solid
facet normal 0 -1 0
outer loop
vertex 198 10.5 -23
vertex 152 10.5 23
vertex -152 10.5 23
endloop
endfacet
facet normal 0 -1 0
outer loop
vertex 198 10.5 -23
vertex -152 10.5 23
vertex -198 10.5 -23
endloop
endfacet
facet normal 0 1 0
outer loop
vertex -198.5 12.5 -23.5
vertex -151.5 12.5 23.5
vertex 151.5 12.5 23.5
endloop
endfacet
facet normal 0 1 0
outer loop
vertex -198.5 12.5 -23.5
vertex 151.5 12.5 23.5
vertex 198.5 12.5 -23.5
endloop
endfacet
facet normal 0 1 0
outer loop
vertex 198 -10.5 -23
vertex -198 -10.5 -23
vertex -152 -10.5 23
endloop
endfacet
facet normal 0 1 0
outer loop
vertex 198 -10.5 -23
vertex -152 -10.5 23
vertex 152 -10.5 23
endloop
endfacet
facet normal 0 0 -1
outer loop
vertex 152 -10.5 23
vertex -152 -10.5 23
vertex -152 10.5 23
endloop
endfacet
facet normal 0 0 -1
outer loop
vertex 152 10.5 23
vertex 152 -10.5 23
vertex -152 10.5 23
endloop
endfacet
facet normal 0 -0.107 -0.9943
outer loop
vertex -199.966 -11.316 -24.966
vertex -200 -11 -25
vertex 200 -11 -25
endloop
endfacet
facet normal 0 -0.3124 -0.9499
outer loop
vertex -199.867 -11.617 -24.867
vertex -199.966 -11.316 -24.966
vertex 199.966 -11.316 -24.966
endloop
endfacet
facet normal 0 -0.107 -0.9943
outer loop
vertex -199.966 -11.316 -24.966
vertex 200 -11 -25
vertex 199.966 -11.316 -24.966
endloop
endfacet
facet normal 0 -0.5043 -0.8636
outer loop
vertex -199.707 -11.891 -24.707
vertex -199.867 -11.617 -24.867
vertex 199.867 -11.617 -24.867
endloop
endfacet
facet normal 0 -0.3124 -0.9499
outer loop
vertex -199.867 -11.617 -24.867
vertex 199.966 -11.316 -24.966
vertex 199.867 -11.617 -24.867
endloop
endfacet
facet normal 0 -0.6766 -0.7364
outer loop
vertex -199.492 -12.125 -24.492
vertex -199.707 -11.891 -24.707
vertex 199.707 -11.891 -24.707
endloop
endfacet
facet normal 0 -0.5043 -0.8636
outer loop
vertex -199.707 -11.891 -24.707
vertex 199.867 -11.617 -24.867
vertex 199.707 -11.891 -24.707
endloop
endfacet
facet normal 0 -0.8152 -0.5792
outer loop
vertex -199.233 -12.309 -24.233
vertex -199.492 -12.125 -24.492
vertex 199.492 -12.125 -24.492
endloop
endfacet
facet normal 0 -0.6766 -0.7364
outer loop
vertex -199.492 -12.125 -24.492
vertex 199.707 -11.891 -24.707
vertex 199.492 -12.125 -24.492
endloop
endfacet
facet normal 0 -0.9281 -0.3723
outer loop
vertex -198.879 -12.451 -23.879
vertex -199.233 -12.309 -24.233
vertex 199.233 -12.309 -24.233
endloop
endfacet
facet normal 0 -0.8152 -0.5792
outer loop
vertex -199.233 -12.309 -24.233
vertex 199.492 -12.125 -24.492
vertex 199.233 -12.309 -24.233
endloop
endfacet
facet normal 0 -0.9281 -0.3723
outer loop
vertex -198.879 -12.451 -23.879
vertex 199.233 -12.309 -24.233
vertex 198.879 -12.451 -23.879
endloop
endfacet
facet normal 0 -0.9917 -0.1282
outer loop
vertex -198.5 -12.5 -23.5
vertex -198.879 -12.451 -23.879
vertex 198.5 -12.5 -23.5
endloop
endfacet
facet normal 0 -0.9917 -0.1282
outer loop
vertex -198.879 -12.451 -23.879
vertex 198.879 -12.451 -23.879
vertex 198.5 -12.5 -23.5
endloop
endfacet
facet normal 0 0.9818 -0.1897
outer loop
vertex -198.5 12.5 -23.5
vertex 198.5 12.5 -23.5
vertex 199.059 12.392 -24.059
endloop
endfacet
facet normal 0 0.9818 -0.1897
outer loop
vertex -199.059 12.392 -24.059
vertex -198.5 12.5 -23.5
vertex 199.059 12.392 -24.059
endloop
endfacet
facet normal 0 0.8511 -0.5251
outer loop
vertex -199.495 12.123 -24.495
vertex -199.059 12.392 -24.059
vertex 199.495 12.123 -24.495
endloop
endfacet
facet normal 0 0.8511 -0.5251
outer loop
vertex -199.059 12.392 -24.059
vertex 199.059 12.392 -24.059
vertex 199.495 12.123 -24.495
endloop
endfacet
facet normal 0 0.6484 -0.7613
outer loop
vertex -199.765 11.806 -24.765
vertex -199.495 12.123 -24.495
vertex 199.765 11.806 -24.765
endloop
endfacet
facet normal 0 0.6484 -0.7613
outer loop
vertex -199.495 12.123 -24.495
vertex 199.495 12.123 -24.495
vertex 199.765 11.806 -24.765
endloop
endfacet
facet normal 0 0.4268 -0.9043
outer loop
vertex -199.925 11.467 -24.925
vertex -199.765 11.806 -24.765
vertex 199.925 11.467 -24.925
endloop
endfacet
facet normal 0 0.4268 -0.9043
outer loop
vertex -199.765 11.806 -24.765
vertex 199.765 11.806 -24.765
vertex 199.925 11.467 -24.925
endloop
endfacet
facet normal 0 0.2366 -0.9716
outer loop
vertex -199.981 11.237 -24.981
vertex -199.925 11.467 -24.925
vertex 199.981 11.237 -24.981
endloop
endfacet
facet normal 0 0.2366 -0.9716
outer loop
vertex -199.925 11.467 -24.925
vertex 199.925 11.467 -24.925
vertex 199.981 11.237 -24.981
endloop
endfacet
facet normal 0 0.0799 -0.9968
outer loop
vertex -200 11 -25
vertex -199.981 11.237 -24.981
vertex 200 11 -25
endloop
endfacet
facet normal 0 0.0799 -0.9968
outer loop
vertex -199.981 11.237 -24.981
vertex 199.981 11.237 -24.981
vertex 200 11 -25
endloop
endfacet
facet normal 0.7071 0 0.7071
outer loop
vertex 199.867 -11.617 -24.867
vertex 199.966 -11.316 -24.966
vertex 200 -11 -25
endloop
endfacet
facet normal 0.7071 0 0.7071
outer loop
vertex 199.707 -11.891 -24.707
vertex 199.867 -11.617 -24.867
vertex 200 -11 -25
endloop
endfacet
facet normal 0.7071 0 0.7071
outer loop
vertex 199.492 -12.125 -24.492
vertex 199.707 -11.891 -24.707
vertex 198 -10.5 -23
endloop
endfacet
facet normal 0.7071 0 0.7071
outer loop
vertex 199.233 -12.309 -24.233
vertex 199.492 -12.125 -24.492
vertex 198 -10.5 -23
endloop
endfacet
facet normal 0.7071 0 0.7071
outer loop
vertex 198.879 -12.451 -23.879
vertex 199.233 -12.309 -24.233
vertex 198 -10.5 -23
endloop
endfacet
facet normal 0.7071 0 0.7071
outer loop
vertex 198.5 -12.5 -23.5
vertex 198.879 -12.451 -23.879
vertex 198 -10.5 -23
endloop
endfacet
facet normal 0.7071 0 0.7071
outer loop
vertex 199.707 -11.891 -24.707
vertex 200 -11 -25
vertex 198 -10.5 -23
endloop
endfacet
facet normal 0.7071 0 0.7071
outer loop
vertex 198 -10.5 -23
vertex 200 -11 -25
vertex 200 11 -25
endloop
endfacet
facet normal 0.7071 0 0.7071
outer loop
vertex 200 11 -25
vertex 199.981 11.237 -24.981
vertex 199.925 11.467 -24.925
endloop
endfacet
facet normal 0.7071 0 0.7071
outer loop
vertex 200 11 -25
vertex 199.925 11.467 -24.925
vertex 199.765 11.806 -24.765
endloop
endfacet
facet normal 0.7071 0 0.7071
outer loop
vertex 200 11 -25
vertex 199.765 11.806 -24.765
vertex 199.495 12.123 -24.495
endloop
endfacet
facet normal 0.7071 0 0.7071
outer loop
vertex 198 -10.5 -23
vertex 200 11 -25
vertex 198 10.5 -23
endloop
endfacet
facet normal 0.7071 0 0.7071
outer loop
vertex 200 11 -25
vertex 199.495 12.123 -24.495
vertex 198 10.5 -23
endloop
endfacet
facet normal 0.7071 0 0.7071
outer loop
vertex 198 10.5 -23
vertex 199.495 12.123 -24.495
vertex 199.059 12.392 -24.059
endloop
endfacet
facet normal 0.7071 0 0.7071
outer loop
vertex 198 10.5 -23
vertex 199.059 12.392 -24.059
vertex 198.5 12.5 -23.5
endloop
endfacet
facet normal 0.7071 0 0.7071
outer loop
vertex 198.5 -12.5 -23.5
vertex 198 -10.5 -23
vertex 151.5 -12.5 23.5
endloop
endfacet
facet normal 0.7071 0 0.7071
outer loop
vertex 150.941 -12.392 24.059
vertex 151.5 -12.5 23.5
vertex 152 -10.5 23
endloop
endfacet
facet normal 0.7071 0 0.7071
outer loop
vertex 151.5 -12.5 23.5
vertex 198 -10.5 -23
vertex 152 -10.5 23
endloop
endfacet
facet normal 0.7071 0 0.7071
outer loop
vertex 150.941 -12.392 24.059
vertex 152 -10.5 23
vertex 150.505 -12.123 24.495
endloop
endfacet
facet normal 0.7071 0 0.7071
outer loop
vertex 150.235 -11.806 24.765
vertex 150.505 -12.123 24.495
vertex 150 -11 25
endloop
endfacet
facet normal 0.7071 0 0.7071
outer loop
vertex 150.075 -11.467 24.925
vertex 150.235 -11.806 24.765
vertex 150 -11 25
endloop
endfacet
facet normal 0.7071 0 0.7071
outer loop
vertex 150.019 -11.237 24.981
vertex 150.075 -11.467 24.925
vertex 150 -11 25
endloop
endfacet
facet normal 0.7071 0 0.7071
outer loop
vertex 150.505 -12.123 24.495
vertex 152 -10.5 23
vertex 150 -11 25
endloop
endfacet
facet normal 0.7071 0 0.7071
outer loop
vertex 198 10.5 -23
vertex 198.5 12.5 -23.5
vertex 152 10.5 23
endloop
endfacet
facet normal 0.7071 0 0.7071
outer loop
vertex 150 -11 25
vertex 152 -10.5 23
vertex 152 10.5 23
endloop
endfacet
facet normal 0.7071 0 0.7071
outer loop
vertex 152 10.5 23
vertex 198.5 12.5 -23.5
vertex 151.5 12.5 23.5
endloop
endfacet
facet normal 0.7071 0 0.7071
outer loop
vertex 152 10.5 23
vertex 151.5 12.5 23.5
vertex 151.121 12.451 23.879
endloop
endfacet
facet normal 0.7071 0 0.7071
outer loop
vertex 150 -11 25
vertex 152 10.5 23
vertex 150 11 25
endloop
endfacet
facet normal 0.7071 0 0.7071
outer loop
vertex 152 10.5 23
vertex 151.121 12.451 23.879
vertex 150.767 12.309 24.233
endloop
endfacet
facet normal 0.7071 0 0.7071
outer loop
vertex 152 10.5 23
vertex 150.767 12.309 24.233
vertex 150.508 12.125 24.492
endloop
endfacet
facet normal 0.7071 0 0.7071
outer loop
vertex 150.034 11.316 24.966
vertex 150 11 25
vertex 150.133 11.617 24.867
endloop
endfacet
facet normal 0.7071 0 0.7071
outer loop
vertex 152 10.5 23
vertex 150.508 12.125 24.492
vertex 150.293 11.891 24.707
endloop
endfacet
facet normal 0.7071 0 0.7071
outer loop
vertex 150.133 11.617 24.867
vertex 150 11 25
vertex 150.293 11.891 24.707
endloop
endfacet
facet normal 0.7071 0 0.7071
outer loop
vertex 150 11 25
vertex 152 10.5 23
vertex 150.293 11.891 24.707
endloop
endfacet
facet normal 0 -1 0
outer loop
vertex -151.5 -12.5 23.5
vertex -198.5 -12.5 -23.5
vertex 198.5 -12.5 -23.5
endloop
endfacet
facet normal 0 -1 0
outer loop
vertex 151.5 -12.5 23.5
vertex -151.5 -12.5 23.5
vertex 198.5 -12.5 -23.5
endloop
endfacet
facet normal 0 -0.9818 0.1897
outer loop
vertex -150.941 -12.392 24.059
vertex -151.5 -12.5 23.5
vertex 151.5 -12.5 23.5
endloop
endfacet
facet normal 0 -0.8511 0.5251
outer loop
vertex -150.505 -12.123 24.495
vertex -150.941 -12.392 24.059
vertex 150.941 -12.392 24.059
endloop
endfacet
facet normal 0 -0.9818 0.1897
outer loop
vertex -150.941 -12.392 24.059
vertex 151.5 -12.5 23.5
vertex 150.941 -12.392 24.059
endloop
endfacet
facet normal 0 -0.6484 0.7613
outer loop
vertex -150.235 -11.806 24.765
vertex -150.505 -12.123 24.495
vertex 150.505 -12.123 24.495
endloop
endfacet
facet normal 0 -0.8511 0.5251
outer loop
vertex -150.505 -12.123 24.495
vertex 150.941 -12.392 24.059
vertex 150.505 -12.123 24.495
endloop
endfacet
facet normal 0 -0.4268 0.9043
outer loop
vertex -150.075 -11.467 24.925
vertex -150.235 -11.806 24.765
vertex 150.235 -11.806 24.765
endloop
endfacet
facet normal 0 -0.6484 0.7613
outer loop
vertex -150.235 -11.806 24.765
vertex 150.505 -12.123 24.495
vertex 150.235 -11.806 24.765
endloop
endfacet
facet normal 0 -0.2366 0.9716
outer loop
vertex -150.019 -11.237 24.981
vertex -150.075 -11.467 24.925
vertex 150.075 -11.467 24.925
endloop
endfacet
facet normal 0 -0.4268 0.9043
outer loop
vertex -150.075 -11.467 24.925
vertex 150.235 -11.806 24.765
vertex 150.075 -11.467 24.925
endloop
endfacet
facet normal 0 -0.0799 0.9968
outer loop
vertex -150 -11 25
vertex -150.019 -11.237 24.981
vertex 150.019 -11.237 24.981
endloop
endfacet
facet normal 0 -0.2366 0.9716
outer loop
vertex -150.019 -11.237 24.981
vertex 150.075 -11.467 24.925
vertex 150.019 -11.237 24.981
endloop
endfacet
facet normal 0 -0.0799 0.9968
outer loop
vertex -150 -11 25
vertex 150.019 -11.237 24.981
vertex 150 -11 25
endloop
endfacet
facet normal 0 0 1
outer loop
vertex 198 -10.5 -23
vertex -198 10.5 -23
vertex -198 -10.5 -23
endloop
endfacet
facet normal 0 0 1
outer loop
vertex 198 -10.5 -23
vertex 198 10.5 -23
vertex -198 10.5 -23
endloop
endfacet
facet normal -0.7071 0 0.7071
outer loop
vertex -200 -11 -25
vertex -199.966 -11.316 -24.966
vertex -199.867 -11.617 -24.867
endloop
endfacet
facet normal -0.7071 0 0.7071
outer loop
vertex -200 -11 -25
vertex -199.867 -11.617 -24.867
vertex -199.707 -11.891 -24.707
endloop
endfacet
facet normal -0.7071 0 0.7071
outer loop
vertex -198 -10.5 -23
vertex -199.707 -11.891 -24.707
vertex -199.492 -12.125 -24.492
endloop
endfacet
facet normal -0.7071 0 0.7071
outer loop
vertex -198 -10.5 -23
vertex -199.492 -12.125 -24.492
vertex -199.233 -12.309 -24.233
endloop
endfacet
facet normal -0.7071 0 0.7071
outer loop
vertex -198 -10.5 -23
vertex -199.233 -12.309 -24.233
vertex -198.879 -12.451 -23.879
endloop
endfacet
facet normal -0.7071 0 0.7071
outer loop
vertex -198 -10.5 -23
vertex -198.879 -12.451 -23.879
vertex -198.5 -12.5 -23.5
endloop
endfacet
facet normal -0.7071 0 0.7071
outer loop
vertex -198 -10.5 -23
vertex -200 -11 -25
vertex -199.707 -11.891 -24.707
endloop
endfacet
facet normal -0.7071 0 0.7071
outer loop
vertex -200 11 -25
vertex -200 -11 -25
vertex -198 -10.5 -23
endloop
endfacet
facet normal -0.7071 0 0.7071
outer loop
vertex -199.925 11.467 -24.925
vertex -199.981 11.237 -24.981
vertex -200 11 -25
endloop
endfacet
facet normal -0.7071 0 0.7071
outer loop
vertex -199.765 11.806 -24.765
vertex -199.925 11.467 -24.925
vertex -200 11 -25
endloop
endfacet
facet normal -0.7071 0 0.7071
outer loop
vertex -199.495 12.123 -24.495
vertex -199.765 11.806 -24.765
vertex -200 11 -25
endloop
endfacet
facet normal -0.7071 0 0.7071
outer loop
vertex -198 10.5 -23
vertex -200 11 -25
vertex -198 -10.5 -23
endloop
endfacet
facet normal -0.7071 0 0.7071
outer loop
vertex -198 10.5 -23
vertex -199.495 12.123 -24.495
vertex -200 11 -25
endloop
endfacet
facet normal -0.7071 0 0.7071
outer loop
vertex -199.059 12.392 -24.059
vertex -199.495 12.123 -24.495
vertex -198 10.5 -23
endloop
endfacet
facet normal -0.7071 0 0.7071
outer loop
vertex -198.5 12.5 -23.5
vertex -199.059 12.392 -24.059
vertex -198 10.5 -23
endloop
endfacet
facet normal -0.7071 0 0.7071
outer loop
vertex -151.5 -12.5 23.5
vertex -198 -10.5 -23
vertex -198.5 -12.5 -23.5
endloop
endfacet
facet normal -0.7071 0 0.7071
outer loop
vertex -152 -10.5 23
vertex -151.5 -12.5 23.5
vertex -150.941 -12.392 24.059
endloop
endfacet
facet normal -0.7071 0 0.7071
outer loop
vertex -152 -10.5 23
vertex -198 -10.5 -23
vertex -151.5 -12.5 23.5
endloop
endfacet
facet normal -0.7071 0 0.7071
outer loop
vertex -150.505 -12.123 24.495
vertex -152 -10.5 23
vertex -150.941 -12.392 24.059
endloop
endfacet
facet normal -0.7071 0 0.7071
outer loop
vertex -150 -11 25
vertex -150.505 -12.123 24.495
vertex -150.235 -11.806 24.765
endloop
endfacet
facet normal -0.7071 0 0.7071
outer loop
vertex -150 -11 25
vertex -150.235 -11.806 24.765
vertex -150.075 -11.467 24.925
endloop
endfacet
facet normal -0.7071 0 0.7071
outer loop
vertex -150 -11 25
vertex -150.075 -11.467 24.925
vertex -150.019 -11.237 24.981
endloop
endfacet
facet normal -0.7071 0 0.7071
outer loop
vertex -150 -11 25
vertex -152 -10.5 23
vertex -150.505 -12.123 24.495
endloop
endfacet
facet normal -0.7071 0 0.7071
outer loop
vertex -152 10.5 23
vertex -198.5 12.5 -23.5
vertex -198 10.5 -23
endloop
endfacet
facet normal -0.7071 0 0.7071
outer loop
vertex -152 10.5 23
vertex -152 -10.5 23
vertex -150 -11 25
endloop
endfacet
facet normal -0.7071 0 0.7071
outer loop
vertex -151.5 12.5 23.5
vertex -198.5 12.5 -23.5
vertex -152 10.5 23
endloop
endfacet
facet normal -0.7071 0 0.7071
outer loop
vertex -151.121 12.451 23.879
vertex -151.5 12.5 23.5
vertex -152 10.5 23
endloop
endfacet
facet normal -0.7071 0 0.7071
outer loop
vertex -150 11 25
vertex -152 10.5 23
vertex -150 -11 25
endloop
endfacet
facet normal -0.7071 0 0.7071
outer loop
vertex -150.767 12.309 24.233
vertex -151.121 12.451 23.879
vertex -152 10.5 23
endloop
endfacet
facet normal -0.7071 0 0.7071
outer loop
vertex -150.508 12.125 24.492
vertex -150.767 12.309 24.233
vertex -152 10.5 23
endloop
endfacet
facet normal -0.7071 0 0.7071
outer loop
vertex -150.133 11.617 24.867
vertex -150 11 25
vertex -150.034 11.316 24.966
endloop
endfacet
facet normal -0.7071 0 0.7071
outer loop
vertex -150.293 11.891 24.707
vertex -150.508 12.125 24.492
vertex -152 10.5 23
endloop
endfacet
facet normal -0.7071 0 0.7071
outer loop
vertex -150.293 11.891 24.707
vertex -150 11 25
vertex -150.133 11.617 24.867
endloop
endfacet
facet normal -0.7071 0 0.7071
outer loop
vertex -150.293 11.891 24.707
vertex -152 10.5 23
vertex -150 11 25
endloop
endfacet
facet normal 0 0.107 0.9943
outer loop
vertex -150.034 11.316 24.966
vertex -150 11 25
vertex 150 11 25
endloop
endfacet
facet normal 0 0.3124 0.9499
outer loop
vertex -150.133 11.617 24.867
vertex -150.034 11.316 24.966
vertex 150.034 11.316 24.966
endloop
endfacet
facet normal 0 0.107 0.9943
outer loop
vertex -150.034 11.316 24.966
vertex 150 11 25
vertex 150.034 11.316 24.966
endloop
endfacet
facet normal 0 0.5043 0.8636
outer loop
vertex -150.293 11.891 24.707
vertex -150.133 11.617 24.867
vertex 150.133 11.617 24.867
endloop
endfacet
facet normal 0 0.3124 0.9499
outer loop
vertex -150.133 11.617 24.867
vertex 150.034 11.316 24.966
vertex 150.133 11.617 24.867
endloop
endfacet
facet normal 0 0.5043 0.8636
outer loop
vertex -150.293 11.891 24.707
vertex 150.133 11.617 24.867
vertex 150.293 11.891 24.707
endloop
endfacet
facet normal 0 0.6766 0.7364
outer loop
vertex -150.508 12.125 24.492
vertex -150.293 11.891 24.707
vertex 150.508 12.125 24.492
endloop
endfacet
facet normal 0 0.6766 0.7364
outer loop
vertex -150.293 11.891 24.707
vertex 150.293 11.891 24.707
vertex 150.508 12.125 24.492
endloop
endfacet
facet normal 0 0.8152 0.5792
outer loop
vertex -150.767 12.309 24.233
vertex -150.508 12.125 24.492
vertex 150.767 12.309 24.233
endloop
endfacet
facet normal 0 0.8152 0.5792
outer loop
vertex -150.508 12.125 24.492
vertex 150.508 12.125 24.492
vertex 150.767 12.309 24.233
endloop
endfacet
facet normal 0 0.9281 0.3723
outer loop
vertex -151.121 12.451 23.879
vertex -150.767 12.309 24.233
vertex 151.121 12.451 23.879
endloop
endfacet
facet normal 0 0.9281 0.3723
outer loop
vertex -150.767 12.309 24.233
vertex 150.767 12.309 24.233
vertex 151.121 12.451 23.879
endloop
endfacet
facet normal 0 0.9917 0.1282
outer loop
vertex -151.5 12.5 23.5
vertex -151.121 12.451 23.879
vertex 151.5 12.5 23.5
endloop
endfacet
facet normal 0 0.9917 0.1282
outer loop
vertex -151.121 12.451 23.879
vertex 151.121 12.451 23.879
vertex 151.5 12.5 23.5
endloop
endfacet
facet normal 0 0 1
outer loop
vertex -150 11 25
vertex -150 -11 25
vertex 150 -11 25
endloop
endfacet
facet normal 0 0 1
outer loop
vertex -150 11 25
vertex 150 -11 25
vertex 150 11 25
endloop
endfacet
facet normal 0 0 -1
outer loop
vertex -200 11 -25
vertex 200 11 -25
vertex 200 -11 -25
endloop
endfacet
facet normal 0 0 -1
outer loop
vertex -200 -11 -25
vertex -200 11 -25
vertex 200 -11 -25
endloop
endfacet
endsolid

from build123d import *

# Parameters (mm, degrees)
BOSS_EXTRUDE1_DEPTH = 762
SHELL1_T            = -2


with BuildPart() as part:
    # Sketch1 → Boss-Extrude1 (new, symmetric)
    with BuildSketch(Plane(origin=(0, 0, 0), x_dir=(0, 0, -1), z_dir=(1, 0, 0))):
        with BuildLine():
            Line((-23.5, 12.5), (23.5, 12.5))
            ThreePointArc((23.5, 12.5), (24.560660172, 12.060660172), (25, 11))
            Line((25, 11), (25, -11))
            ThreePointArc((25, -11), (24.560660172, -12.060660172), (23.5, -12.5))
            Line((23.5, -12.5), (-23.5, -12.5))
            ThreePointArc((-23.5, -12.5), (-24.560660172, -12.060660172), (-25, -11))
            Line((-25, -11), (-25, 11))
            ThreePointArc((-25, 11), (-24.560660172, 12.060660172), (-23.5, 12.5))
        make_face()
    extrude(amount=BOSS_EXTRUDE1_DEPTH, both=True)

    # Shell1
    shell1_openings = [part.faces().sort_by_distance(p)[0] for p in [
        (762, 0, 0),
        (-762, 0, 0),
    ]]
    offset(amount=SHELL1_T, openings=shell1_openings, kind=Kind.INTERSECTION)

    # SurfaceCut1
    split(bisect_by=Plane(origin=(-87.5, 0, 87.5), x_dir=(0.707106781186551, 0, 0.7071067811865441), z_dir=(-0.7071067811865441, 0, 0.707106781186551)), keep=Keep.BOTTOM)

    # SurfaceCut2
    split(bisect_by=Plane(origin=(87.5, 0, 87.5), x_dir=(-0.707106781186551, 0, 0.7071067811865441), z_dir=(-0.7071067811865441, 0, -0.707106781186551)), keep=Keep.TOP)


solid = part.part
